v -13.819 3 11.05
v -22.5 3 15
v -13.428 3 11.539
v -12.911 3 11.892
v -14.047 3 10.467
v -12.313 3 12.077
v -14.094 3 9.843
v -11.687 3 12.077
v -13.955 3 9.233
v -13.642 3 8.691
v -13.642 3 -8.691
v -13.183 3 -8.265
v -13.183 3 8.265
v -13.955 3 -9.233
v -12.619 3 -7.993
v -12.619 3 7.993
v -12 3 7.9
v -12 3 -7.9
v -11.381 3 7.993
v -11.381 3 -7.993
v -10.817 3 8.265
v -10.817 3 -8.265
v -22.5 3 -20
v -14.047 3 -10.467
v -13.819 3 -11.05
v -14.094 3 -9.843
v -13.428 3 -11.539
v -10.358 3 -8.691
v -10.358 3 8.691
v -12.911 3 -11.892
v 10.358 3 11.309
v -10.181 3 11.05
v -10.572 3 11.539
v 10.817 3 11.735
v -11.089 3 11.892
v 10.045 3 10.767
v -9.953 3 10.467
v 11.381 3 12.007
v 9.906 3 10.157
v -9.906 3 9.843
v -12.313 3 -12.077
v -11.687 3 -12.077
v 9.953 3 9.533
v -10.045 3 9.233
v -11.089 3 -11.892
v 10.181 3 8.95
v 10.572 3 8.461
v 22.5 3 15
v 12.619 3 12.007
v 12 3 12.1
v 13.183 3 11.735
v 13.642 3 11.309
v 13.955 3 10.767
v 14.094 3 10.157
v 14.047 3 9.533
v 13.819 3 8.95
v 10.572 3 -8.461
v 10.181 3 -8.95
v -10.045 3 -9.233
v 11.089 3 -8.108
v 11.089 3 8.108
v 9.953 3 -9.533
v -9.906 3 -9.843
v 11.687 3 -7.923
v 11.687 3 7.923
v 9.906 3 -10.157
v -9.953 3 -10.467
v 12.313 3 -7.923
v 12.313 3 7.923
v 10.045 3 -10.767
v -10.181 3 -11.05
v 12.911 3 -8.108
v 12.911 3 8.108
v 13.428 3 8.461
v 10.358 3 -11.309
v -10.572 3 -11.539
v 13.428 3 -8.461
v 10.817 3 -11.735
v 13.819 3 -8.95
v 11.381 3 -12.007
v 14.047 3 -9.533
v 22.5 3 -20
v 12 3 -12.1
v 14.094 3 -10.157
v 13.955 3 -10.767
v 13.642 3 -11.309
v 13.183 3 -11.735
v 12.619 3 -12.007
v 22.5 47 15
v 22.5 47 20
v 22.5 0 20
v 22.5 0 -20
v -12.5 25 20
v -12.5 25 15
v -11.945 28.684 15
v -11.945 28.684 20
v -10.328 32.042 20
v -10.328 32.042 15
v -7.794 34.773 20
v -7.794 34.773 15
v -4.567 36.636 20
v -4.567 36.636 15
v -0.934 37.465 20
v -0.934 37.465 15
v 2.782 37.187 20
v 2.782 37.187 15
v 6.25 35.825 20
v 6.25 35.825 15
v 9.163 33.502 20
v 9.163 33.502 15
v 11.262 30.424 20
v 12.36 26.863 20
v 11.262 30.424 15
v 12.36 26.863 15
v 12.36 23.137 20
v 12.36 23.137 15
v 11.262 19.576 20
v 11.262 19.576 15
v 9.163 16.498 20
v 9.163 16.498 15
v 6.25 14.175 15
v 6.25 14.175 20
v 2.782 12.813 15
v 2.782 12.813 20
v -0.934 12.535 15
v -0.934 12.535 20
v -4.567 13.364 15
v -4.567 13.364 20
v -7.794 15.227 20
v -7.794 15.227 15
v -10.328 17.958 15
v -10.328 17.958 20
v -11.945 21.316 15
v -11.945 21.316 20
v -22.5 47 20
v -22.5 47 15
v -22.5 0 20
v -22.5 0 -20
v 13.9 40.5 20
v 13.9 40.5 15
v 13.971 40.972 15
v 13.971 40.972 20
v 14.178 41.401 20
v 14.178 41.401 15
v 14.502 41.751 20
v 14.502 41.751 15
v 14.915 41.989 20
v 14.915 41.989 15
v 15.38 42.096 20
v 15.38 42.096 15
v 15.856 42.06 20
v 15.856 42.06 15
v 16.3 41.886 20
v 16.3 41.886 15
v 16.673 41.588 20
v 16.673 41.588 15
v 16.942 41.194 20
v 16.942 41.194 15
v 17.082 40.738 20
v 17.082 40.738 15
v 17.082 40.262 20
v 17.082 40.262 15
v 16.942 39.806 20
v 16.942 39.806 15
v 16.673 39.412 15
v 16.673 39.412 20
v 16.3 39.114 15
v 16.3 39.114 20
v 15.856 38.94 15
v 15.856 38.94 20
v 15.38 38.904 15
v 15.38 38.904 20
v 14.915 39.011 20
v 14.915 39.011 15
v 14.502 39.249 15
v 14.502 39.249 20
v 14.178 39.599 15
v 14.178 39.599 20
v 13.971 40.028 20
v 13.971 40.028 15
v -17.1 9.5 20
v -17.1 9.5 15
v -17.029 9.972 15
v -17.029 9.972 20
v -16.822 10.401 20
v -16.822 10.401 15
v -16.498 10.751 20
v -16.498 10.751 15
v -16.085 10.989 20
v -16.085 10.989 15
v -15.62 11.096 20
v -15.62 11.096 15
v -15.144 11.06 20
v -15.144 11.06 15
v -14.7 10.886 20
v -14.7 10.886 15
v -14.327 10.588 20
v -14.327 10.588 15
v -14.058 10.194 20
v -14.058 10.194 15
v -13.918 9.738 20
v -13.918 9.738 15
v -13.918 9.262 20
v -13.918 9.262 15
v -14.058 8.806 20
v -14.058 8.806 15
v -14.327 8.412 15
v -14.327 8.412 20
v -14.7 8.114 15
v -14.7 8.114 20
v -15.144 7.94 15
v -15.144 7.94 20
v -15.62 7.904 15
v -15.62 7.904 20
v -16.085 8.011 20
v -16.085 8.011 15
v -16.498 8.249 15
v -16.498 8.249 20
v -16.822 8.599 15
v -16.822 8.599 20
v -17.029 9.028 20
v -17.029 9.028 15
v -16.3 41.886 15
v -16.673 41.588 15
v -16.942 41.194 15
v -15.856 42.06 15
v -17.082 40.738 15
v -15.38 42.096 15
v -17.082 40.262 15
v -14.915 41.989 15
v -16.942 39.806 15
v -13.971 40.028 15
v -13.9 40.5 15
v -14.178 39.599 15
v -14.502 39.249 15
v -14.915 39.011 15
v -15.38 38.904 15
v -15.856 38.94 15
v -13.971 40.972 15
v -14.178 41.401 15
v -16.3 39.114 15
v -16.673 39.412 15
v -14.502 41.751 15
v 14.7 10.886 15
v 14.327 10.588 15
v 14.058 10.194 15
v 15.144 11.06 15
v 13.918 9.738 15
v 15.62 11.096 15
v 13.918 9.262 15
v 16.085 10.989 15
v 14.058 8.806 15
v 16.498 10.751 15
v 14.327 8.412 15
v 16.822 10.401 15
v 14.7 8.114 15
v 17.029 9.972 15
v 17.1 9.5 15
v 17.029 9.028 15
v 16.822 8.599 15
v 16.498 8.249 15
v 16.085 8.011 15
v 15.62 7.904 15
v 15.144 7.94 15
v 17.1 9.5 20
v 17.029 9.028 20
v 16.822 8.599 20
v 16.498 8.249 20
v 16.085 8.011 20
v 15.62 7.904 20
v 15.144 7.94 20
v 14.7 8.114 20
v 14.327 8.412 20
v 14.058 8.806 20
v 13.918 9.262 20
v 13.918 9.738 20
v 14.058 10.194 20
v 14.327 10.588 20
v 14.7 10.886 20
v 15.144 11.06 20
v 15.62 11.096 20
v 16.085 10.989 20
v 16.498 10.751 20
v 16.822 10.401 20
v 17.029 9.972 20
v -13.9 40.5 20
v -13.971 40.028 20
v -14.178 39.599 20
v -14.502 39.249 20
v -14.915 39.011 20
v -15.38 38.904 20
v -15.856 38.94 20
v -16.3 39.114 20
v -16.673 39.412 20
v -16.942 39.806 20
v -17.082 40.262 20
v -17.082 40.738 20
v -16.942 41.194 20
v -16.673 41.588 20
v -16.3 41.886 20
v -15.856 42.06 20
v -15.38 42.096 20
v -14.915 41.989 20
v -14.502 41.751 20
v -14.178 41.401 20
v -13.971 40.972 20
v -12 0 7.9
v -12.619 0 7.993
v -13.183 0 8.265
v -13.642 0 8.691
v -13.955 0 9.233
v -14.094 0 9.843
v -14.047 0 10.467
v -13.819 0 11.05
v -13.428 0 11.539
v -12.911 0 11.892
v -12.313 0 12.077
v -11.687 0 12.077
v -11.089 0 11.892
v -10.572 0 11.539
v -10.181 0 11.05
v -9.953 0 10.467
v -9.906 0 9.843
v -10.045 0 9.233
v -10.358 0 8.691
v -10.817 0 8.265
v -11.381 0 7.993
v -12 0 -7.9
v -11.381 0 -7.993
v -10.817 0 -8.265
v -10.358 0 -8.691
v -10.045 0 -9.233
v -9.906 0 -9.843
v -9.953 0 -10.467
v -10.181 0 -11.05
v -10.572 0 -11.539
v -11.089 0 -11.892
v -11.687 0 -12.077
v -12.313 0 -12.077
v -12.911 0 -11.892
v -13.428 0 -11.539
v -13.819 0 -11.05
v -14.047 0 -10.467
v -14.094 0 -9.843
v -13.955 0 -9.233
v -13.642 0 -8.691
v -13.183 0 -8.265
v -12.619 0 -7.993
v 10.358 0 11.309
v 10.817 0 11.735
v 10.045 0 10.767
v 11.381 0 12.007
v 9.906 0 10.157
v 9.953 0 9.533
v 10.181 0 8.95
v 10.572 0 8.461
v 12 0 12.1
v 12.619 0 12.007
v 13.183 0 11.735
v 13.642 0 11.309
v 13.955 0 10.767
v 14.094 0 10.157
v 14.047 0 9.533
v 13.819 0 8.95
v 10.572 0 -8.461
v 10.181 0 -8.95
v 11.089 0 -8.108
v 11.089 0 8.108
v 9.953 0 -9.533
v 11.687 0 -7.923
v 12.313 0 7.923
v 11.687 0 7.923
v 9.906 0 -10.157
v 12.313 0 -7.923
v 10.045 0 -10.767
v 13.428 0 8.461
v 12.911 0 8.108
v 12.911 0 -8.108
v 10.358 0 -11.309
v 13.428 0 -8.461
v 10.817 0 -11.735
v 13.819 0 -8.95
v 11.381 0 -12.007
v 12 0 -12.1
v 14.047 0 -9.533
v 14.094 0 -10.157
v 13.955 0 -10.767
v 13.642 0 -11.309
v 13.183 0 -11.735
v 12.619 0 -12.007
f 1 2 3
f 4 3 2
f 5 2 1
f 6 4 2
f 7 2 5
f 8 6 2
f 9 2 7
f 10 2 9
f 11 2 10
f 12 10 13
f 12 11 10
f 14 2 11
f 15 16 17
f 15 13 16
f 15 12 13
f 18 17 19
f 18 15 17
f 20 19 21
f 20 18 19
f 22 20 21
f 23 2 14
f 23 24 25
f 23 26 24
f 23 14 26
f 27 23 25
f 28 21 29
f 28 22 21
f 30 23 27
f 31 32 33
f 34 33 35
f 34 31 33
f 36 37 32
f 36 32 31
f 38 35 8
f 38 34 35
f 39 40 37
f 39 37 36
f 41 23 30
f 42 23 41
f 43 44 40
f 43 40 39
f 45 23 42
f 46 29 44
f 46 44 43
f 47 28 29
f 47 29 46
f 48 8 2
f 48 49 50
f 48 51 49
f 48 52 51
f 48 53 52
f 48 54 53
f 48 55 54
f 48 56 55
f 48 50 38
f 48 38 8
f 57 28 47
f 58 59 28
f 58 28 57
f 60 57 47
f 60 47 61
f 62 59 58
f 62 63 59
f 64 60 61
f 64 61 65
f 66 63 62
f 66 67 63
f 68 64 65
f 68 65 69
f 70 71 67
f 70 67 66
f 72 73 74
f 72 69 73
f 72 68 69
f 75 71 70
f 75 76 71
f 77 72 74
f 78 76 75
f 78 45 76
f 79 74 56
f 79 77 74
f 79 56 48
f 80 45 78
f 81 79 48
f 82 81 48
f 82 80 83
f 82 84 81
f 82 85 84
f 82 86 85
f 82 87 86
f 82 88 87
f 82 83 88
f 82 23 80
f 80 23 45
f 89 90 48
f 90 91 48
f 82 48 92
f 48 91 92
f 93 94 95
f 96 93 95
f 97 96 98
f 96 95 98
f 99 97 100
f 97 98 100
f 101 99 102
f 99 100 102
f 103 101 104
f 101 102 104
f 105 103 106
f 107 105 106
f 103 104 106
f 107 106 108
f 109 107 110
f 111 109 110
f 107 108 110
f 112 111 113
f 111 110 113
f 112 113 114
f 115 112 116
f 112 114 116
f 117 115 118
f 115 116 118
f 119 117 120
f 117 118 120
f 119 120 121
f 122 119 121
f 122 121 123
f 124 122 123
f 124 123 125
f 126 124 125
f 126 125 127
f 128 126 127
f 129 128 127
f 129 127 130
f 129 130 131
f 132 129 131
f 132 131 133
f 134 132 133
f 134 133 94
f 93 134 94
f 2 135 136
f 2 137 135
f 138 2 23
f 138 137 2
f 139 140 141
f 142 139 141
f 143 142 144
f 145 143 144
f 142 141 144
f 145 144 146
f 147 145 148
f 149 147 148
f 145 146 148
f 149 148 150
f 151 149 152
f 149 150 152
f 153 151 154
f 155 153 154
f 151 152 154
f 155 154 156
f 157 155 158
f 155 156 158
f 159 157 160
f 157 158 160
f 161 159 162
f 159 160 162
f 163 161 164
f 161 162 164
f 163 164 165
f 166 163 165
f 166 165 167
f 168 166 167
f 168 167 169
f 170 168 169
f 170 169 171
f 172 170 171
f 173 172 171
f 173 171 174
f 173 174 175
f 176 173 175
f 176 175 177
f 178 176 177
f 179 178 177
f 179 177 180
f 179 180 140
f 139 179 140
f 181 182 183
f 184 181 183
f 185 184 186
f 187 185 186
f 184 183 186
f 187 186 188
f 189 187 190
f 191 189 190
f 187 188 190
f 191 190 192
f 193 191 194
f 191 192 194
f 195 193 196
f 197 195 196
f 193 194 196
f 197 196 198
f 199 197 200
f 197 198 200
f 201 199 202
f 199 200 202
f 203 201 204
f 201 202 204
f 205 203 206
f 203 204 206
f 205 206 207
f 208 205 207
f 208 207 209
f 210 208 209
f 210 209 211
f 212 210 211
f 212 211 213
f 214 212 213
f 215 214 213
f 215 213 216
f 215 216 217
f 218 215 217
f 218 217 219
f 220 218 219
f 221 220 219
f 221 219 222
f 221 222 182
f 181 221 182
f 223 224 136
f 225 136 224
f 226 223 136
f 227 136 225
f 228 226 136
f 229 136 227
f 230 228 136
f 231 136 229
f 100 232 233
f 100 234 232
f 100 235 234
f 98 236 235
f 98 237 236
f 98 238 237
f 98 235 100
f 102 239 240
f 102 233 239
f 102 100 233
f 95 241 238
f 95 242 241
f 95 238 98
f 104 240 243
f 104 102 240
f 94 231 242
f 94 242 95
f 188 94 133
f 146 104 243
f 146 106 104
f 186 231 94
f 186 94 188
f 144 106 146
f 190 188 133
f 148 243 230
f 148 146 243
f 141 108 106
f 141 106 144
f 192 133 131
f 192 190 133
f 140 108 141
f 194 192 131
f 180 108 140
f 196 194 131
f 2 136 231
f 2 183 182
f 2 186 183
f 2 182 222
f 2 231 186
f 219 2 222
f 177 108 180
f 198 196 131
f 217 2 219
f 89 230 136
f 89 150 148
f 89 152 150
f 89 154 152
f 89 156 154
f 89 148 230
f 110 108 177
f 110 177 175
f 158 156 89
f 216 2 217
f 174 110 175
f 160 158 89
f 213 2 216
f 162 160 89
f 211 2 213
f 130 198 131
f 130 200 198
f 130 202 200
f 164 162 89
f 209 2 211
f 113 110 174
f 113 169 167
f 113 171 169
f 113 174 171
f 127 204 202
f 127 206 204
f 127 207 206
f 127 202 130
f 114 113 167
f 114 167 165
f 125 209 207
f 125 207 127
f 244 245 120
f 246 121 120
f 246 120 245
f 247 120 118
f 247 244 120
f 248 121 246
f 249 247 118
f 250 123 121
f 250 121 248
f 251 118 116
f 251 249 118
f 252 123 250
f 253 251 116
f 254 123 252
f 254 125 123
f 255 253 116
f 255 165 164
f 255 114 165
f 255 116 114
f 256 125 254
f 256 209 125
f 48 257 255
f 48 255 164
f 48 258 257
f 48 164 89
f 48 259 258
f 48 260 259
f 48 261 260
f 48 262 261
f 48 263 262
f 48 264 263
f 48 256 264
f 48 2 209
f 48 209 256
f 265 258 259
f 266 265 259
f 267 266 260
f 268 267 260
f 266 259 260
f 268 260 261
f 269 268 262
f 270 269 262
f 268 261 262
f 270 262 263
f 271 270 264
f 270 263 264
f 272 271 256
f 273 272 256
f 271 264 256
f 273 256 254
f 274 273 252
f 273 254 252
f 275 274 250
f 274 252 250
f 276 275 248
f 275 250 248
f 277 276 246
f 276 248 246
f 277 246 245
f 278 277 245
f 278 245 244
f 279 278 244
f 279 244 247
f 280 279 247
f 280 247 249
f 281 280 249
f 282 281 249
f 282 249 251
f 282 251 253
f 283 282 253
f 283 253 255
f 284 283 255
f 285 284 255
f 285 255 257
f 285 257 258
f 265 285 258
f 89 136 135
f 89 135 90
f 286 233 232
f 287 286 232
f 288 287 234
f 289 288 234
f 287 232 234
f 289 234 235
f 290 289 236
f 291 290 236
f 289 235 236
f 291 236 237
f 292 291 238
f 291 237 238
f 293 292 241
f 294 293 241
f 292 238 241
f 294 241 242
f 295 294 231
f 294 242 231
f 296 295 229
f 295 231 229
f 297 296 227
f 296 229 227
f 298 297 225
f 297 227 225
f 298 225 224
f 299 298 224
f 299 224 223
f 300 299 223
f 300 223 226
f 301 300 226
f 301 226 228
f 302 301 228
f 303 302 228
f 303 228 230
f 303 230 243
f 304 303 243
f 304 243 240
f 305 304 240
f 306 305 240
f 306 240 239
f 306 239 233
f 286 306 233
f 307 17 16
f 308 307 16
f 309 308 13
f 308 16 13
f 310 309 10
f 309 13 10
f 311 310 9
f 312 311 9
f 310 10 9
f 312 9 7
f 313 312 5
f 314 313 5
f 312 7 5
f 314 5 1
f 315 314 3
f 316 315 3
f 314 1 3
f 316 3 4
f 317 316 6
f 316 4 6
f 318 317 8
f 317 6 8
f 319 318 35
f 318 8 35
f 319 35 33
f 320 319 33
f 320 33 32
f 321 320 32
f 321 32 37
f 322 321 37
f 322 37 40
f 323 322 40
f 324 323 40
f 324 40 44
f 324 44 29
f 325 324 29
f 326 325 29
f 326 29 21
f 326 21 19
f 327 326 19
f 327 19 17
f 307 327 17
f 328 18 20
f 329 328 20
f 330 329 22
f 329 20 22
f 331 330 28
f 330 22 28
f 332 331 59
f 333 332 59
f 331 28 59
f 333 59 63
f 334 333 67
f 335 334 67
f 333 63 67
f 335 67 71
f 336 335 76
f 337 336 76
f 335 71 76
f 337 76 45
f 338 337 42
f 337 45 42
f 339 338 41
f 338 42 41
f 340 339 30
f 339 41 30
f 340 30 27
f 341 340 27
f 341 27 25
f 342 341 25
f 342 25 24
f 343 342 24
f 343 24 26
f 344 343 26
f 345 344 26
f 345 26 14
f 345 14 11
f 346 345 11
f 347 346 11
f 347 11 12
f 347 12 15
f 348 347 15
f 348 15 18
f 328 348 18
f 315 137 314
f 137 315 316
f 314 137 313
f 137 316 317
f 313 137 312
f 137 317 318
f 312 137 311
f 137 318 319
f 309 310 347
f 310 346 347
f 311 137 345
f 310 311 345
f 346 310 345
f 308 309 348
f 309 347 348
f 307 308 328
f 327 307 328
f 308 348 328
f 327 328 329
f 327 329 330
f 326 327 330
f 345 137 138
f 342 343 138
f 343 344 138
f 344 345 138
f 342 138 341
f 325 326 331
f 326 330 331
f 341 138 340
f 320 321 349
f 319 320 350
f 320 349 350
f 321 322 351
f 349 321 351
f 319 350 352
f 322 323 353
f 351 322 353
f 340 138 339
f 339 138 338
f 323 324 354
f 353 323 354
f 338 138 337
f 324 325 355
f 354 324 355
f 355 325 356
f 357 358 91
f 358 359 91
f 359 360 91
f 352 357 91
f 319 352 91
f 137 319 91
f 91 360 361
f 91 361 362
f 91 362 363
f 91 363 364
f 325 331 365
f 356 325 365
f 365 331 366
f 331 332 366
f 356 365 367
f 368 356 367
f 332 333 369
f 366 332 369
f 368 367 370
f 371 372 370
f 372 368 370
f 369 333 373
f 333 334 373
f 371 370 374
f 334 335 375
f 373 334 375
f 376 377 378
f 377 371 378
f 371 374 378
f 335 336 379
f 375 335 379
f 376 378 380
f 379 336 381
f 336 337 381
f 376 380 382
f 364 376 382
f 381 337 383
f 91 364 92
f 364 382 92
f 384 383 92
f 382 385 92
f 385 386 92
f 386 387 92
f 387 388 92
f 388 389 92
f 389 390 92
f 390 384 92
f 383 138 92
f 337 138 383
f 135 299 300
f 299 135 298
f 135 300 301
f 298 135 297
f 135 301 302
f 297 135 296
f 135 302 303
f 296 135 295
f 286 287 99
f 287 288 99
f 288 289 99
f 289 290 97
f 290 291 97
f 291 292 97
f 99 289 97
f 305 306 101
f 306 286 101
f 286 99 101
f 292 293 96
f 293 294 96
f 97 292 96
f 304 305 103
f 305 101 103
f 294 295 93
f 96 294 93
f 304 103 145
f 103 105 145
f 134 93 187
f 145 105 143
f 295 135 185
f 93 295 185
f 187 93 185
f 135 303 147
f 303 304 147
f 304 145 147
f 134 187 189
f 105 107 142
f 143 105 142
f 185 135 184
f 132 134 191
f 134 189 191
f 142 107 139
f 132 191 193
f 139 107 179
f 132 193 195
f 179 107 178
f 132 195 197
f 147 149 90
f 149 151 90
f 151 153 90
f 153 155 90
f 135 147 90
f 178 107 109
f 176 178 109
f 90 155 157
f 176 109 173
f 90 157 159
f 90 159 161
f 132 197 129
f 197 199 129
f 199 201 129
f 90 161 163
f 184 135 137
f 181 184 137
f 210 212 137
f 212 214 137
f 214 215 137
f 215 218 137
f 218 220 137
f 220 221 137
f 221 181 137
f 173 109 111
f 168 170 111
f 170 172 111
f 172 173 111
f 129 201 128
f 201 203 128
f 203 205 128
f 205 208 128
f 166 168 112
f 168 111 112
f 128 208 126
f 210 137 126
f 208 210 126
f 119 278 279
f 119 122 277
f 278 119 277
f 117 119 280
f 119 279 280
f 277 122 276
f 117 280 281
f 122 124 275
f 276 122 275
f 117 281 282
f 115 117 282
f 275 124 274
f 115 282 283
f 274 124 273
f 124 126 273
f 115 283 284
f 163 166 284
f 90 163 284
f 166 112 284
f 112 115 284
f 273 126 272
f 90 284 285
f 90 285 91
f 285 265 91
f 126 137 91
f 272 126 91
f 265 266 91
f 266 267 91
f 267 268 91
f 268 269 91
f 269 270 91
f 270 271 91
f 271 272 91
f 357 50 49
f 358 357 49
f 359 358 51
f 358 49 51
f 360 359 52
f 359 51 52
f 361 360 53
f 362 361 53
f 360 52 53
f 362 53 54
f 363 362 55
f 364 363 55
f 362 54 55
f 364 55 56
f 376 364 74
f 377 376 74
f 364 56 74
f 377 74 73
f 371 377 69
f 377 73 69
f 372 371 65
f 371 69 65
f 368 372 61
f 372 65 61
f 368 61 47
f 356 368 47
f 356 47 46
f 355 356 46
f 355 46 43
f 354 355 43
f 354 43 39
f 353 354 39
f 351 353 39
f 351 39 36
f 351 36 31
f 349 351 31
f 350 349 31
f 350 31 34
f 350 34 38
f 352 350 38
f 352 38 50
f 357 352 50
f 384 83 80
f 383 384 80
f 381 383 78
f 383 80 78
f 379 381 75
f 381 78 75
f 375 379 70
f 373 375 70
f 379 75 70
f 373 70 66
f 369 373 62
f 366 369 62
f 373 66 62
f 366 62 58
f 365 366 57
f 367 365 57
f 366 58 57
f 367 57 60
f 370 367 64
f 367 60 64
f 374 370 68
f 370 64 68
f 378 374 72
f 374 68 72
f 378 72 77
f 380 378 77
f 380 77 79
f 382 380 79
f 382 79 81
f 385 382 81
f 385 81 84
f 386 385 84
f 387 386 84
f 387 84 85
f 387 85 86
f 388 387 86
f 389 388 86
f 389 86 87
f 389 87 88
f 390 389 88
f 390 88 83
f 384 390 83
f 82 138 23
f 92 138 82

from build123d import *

# Parameters (mm, degrees)
SKETCH_2_W          = 45
SKETCH_2_H          = 40
EXTRUDE_1_DEPTH     = 3
SKETCH_3_R          = 2.1
CUT_EXTRUDE_1_DEPTH = 31.253099015
SKETCH_4_W          = 45
SKETCH_4_H          = 5
EXTRUDE_2_DEPTH     = 44
SKETCH_6_R          = 1.6
SKETCH_6_R_2        = 12.5
CUT_EXTRUDE_3_DEPTH = 63.77141069


with BuildPart() as part:
    # ｽｹｯﾁ2 → ﾎﾞｽ - 押し出し1 (new body)
    with BuildSketch(Plane(origin=(0, 0, 0), x_dir=(1, 0, 0), z_dir=(0, 1, 0))):
        Rectangle(SKETCH_2_W, SKETCH_2_H)
    extrude(amount=EXTRUDE_1_DEPTH)

    # ｽｹｯﾁ3 → ｶｯﾄ - 押し出し1 (cut, through all)
    with BuildSketch(Plane(origin=(0, 3, 0), x_dir=(1, 0, 0), z_dir=(0, 1, 0))):
        with Locations(Location((-12, 10, 0), (0, 0, 270))):
            Circle(SKETCH_3_R)
        with Locations(Location((12, 10, 0), (0, 0, 90))):
            Circle(SKETCH_3_R)
        with Locations(Location((12, -10, 0), (0, 0, 270))):
            Circle(SKETCH_3_R)
        with Locations(Location((-12, -10, 0), (0, 0, 90))):
            Circle(SKETCH_3_R)
    extrude(amount=-CUT_EXTRUDE_1_DEPTH, mode=Mode.SUBTRACT)

    # ｽｹｯﾁ4 → ﾎﾞｽ - 押し出し2 (add)
    with BuildSketch(Plane(origin=(0, 3, 0), x_dir=(1, 0, 0), z_dir=(0, 1, 0))):
        with Locations((0, -17.5)):
            Rectangle(SKETCH_4_W, SKETCH_4_H)
    extrude(amount=EXTRUDE_2_DEPTH)

    # ｽｹｯﾁ6 → ｶｯﾄ - 押し出し3 (cut, through all)
    with BuildSketch(Plane(origin=(0, 0, 15), x_dir=(-1, 0, 0), z_dir=(0, 0, -1))):
        with Locations((-15.5, 40.5)):
            Circle(SKETCH_6_R)
        with Locations(Location((15.5, 40.5, 0), (0, 0, 180))):
            Circle(SKETCH_6_R)
        with Locations((15.5, 9.5)):
            Circle(SKETCH_6_R)
        with Locations(Location((-15.5, 9.5, 0), (0, 0, 180))):
            Circle(SKETCH_6_R)
        with Locations((0, 25)):
            Circle(SKETCH_6_R_2)
    extrude(amount=-CUT_EXTRUDE_3_DEPTH, mode=Mode.SUBTRACT)


solid = part.part
